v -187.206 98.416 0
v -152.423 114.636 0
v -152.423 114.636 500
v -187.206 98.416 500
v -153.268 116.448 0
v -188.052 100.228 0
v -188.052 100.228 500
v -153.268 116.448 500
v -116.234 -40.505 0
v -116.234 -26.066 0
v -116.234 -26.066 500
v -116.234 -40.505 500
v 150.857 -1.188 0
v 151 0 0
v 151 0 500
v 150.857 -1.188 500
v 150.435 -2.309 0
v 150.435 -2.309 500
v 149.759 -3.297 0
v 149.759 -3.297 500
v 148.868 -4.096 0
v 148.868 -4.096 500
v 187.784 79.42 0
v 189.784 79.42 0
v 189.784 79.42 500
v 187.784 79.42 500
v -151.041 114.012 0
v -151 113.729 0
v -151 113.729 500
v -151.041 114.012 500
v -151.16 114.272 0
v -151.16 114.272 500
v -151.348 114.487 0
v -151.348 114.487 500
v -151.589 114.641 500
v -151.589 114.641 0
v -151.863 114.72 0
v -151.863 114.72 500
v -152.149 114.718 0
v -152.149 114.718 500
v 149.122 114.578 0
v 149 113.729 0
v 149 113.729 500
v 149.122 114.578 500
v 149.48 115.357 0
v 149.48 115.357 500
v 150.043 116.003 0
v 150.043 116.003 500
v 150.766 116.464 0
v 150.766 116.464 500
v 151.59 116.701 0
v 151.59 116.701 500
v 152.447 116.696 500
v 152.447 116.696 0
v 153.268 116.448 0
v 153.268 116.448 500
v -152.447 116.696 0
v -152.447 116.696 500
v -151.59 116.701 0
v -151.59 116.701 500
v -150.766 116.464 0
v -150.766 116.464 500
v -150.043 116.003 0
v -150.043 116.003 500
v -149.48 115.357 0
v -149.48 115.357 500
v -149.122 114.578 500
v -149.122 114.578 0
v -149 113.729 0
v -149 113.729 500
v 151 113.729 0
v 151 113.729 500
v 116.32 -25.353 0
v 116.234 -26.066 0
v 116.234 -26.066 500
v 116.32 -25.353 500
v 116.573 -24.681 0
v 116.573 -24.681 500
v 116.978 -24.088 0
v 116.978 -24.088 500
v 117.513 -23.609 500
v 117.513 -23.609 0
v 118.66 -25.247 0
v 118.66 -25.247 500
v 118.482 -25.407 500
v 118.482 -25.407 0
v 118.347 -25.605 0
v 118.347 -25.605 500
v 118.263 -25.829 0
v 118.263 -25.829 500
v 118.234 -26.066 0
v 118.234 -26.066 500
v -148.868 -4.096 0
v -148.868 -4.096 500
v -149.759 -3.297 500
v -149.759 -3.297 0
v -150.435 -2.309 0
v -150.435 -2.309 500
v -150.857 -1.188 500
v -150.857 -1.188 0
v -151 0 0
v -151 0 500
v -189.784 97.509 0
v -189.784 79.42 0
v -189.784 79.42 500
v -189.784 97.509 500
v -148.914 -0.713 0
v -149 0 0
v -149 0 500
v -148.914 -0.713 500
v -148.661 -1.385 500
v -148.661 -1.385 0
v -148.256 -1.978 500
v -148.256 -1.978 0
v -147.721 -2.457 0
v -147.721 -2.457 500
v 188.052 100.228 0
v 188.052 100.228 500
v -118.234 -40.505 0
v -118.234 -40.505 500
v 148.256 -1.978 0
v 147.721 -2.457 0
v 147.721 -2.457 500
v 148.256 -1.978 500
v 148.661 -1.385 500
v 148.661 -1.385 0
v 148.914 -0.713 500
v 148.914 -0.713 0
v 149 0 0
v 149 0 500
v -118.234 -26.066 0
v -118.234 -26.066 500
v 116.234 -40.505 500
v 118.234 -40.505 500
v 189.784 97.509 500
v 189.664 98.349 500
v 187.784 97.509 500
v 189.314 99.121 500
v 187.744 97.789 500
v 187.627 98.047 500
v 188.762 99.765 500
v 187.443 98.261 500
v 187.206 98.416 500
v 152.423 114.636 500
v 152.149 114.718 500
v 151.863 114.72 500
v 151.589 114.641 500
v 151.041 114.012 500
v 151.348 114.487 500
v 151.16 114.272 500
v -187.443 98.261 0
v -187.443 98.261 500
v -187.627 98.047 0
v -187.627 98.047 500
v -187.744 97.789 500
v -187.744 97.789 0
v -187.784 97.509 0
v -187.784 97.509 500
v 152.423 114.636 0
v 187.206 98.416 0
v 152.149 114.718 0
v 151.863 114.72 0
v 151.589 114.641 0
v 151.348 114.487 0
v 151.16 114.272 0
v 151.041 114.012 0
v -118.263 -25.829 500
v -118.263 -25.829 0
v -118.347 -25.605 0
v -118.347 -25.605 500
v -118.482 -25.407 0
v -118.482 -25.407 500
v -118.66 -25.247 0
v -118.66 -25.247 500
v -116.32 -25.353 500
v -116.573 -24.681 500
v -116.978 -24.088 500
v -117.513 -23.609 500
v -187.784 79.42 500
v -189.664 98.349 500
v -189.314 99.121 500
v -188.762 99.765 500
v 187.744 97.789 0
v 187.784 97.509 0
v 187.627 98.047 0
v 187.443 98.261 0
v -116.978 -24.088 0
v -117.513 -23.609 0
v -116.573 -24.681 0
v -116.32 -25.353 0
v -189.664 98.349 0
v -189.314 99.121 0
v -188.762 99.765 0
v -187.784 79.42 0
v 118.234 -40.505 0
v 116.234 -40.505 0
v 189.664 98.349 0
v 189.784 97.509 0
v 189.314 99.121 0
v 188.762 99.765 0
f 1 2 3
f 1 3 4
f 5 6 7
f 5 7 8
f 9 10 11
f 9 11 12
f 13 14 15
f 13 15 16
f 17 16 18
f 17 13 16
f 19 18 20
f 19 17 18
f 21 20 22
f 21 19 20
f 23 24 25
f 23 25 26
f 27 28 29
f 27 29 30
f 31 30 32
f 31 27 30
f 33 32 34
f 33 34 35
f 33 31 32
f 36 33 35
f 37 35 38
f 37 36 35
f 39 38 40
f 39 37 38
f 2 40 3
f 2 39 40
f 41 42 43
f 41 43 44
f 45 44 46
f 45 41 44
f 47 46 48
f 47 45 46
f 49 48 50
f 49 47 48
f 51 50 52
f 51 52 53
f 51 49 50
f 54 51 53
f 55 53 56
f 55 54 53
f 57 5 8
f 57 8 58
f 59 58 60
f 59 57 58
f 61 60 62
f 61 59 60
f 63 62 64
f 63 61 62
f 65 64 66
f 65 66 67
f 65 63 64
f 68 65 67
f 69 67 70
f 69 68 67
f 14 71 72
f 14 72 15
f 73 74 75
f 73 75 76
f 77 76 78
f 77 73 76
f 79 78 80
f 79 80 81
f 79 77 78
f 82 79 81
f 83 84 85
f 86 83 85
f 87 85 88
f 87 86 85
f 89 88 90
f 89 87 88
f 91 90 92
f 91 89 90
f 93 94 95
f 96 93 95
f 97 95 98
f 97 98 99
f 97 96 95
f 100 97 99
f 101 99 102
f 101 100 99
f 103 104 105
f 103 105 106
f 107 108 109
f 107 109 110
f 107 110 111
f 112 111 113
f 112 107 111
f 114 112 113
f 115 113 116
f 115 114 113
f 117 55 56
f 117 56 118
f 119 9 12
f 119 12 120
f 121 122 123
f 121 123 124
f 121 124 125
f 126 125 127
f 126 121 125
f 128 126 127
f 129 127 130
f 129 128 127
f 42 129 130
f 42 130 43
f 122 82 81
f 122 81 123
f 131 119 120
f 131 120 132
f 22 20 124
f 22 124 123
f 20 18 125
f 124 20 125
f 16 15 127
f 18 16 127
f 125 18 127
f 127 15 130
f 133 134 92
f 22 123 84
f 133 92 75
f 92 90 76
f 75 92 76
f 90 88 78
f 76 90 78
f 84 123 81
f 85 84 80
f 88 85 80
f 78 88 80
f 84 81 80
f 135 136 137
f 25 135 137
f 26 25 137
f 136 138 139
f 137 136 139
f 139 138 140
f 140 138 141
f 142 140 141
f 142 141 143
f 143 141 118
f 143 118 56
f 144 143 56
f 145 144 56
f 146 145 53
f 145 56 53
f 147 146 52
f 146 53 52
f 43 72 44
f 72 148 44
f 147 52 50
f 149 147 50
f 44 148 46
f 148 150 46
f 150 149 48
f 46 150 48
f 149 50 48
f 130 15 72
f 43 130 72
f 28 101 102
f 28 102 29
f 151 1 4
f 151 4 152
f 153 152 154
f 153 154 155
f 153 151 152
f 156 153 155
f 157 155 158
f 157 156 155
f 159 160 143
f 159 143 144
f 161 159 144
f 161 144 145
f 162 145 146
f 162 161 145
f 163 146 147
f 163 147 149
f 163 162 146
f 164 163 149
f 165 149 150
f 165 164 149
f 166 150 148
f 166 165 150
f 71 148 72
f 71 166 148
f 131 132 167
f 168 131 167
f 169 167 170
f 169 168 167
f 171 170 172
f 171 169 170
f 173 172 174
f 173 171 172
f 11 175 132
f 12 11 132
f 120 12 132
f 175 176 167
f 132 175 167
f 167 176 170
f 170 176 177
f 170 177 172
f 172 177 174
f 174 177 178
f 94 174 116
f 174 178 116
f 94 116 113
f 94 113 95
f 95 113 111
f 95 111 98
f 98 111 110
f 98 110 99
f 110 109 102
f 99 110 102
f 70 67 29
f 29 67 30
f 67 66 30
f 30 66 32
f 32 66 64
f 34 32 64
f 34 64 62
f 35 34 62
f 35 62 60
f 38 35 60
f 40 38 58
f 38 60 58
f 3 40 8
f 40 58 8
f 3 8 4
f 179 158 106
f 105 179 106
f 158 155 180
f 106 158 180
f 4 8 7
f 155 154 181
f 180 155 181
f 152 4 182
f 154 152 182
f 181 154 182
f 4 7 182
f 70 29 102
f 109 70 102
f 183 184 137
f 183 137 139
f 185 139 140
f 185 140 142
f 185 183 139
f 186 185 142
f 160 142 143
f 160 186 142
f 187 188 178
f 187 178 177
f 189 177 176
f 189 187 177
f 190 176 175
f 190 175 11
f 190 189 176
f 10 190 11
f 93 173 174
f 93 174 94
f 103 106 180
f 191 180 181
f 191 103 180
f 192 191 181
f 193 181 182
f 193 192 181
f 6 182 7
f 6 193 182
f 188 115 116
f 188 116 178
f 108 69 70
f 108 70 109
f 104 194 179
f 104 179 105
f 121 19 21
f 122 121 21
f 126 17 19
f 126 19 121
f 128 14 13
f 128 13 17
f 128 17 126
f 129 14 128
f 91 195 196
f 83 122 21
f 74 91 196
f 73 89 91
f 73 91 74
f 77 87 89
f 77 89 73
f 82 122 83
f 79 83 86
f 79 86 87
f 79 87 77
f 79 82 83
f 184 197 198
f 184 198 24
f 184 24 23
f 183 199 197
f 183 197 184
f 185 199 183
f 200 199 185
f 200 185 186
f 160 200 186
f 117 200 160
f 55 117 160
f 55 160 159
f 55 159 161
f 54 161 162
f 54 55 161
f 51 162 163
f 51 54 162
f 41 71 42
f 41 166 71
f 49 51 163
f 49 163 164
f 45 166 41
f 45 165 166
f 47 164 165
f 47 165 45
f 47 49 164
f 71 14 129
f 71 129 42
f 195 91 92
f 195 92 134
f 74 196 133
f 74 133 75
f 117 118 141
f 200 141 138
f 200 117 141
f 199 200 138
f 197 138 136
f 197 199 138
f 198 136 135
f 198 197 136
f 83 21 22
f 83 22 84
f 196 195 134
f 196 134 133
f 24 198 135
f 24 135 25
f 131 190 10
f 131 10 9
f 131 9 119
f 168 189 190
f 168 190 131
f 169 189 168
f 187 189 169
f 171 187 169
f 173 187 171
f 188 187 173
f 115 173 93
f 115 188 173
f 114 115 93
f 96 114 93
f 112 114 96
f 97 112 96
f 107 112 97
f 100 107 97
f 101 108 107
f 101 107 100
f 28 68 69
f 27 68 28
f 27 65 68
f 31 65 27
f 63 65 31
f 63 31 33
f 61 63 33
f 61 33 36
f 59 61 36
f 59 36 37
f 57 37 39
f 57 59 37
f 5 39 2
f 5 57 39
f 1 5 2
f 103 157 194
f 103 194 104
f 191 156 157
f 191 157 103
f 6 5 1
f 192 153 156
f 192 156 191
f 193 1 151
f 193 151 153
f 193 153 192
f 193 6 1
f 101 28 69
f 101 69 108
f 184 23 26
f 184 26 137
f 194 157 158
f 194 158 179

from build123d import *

# Parameters (mm, degrees)
BOSS_EXTRUDE1_DEPTH   = 500
BOSS_EXTRUDE1_2_DEPTH = 500


with BuildPart() as part:
    # Sketch1 → Boss-Extrude1 (new body)
    with BuildSketch(Plane.XY):
        with BuildLine():
            ThreePointArc((-118.233918228, -26.066459757), (-118.346907395, -25.604711144), (-118.660341792, -25.247307713))
            Line((-118.660341792, -25.247307713), (-148.867882182, -4.095760221))
            ThreePointArc((-148.867882182, -4.095760221), (-150.435054166, -2.308743066), (-151, 0))
            Line((-151, 0), (-151, 113.729242117))
            ThreePointArc((-151, 113.729242117), (-151.462700392, 114.572633563), (-152.422618262, 114.635549904))
            Line((-152.422618262, 114.635549904), (-187.206468678, 98.415574075))
            ThreePointArc((-187.206468678, 98.415574075), (-187.627241862, 98.046565896), (-187.783850417, 97.509266288))
            Line((-187.783850417, 97.509266288), (-187.783850417, 79.42047707))
            Line((-187.783850417, 79.42047707), (-189.783850417, 79.42047707))
            Line((-189.783850417, 79.42047707), (-189.783850417, 97.509266288))
            ThreePointArc((-189.783850417, 97.509266288), (-189.314024754, 99.121165113), (-188.051705202, 100.228189649))
            Line((-188.051705202, 100.228189649), (-153.267854785, 116.448165478))
            ThreePointArc((-153.267854785, 116.448165478), (-150.388101175, 116.259416454), (-149, 113.729242117))
            Line((-149, 113.729242117), (-149, 0))
            ThreePointArc((-149, 0), (-148.6610325, -1.38524584), (-147.720729309, -2.457456133))
            Line((-147.720729309, -2.457456133), (-117.513188919, -23.609003624))
            ThreePointArc((-117.513188919, -23.609003624), (-116.572885729, -24.681213918), (-116.233918228, -26.066459757))
            Line((-116.233918228, -26.066459757), (-116.233918228, -40.504758606))
            Line((-116.233918228, -40.504758606), (-118.233918228, -40.504758606))
            Line((-118.233918228, -40.504758606), (-118.233918228, -26.066459757))
        make_face()
    extrude(amount=BOSS_EXTRUDE1_DEPTH)


with BuildPart() as body_2:
    # Sketch1 → Boss-Extrude1 2 (new body)
    with BuildSketch(Plane.XY):
        with BuildLine():
            ThreePointArc((116.233918228, -26.066459757), (116.572885729, -24.681213918), (117.513188919, -23.609003624))
            Line((117.513188919, -23.609003624), (147.720729309, -2.457456133))
            ThreePointArc((147.720729309, -2.457456133), (148.6610325, -1.38524584), (149, 0))
            Line((149, 0), (149, 113.729242117))
            ThreePointArc((149, 113.729242117), (150.388101175, 116.259416454), (153.267854785, 116.448165478))
            Line((153.267854785, 116.448165478), (188.051705202, 100.228189649))
            ThreePointArc((188.051705202, 100.228189649), (189.314024754, 99.121165113), (189.783850417, 97.509266288))
            Line((189.783850417, 97.509266288), (189.783850417, 79.42047707))
            Line((189.783850417, 79.42047707), (187.783850417, 79.42047707))
            Line((187.783850417, 79.42047707), (187.783850417, 97.509266288))
            ThreePointArc((187.783850417, 97.509266288), (187.627241862, 98.046565896), (187.206468678, 98.415574075))
            Line((187.206468678, 98.415574075), (152.422618262, 114.635549904))
            ThreePointArc((152.422618262, 114.635549904), (151.462700392, 114.572633563), (151, 113.729242117))
            Line((151, 113.729242117), (151, 0))
            ThreePointArc((151, 0), (150.435054166, -2.308743066), (148.867882182, -4.095760221))
            Line((148.867882182, -4.095760221), (118.660341792, -25.247307713))
            ThreePointArc((118.660341792, -25.247307713), (118.346907395, -25.604711144), (118.233918228, -26.066459757))
            Line((118.233918228, -26.066459757), (118.233918228, -40.504758606))
            Line((118.233918228, -40.504758606), (116.233918228, -40.504758606))
            Line((116.233918228, -40.504758606), (116.233918228, -26.066459757))
        make_face()
    extrude(amount=BOSS_EXTRUDE1_2_DEPTH)


solid = Compound([part.part, body_2.part])
